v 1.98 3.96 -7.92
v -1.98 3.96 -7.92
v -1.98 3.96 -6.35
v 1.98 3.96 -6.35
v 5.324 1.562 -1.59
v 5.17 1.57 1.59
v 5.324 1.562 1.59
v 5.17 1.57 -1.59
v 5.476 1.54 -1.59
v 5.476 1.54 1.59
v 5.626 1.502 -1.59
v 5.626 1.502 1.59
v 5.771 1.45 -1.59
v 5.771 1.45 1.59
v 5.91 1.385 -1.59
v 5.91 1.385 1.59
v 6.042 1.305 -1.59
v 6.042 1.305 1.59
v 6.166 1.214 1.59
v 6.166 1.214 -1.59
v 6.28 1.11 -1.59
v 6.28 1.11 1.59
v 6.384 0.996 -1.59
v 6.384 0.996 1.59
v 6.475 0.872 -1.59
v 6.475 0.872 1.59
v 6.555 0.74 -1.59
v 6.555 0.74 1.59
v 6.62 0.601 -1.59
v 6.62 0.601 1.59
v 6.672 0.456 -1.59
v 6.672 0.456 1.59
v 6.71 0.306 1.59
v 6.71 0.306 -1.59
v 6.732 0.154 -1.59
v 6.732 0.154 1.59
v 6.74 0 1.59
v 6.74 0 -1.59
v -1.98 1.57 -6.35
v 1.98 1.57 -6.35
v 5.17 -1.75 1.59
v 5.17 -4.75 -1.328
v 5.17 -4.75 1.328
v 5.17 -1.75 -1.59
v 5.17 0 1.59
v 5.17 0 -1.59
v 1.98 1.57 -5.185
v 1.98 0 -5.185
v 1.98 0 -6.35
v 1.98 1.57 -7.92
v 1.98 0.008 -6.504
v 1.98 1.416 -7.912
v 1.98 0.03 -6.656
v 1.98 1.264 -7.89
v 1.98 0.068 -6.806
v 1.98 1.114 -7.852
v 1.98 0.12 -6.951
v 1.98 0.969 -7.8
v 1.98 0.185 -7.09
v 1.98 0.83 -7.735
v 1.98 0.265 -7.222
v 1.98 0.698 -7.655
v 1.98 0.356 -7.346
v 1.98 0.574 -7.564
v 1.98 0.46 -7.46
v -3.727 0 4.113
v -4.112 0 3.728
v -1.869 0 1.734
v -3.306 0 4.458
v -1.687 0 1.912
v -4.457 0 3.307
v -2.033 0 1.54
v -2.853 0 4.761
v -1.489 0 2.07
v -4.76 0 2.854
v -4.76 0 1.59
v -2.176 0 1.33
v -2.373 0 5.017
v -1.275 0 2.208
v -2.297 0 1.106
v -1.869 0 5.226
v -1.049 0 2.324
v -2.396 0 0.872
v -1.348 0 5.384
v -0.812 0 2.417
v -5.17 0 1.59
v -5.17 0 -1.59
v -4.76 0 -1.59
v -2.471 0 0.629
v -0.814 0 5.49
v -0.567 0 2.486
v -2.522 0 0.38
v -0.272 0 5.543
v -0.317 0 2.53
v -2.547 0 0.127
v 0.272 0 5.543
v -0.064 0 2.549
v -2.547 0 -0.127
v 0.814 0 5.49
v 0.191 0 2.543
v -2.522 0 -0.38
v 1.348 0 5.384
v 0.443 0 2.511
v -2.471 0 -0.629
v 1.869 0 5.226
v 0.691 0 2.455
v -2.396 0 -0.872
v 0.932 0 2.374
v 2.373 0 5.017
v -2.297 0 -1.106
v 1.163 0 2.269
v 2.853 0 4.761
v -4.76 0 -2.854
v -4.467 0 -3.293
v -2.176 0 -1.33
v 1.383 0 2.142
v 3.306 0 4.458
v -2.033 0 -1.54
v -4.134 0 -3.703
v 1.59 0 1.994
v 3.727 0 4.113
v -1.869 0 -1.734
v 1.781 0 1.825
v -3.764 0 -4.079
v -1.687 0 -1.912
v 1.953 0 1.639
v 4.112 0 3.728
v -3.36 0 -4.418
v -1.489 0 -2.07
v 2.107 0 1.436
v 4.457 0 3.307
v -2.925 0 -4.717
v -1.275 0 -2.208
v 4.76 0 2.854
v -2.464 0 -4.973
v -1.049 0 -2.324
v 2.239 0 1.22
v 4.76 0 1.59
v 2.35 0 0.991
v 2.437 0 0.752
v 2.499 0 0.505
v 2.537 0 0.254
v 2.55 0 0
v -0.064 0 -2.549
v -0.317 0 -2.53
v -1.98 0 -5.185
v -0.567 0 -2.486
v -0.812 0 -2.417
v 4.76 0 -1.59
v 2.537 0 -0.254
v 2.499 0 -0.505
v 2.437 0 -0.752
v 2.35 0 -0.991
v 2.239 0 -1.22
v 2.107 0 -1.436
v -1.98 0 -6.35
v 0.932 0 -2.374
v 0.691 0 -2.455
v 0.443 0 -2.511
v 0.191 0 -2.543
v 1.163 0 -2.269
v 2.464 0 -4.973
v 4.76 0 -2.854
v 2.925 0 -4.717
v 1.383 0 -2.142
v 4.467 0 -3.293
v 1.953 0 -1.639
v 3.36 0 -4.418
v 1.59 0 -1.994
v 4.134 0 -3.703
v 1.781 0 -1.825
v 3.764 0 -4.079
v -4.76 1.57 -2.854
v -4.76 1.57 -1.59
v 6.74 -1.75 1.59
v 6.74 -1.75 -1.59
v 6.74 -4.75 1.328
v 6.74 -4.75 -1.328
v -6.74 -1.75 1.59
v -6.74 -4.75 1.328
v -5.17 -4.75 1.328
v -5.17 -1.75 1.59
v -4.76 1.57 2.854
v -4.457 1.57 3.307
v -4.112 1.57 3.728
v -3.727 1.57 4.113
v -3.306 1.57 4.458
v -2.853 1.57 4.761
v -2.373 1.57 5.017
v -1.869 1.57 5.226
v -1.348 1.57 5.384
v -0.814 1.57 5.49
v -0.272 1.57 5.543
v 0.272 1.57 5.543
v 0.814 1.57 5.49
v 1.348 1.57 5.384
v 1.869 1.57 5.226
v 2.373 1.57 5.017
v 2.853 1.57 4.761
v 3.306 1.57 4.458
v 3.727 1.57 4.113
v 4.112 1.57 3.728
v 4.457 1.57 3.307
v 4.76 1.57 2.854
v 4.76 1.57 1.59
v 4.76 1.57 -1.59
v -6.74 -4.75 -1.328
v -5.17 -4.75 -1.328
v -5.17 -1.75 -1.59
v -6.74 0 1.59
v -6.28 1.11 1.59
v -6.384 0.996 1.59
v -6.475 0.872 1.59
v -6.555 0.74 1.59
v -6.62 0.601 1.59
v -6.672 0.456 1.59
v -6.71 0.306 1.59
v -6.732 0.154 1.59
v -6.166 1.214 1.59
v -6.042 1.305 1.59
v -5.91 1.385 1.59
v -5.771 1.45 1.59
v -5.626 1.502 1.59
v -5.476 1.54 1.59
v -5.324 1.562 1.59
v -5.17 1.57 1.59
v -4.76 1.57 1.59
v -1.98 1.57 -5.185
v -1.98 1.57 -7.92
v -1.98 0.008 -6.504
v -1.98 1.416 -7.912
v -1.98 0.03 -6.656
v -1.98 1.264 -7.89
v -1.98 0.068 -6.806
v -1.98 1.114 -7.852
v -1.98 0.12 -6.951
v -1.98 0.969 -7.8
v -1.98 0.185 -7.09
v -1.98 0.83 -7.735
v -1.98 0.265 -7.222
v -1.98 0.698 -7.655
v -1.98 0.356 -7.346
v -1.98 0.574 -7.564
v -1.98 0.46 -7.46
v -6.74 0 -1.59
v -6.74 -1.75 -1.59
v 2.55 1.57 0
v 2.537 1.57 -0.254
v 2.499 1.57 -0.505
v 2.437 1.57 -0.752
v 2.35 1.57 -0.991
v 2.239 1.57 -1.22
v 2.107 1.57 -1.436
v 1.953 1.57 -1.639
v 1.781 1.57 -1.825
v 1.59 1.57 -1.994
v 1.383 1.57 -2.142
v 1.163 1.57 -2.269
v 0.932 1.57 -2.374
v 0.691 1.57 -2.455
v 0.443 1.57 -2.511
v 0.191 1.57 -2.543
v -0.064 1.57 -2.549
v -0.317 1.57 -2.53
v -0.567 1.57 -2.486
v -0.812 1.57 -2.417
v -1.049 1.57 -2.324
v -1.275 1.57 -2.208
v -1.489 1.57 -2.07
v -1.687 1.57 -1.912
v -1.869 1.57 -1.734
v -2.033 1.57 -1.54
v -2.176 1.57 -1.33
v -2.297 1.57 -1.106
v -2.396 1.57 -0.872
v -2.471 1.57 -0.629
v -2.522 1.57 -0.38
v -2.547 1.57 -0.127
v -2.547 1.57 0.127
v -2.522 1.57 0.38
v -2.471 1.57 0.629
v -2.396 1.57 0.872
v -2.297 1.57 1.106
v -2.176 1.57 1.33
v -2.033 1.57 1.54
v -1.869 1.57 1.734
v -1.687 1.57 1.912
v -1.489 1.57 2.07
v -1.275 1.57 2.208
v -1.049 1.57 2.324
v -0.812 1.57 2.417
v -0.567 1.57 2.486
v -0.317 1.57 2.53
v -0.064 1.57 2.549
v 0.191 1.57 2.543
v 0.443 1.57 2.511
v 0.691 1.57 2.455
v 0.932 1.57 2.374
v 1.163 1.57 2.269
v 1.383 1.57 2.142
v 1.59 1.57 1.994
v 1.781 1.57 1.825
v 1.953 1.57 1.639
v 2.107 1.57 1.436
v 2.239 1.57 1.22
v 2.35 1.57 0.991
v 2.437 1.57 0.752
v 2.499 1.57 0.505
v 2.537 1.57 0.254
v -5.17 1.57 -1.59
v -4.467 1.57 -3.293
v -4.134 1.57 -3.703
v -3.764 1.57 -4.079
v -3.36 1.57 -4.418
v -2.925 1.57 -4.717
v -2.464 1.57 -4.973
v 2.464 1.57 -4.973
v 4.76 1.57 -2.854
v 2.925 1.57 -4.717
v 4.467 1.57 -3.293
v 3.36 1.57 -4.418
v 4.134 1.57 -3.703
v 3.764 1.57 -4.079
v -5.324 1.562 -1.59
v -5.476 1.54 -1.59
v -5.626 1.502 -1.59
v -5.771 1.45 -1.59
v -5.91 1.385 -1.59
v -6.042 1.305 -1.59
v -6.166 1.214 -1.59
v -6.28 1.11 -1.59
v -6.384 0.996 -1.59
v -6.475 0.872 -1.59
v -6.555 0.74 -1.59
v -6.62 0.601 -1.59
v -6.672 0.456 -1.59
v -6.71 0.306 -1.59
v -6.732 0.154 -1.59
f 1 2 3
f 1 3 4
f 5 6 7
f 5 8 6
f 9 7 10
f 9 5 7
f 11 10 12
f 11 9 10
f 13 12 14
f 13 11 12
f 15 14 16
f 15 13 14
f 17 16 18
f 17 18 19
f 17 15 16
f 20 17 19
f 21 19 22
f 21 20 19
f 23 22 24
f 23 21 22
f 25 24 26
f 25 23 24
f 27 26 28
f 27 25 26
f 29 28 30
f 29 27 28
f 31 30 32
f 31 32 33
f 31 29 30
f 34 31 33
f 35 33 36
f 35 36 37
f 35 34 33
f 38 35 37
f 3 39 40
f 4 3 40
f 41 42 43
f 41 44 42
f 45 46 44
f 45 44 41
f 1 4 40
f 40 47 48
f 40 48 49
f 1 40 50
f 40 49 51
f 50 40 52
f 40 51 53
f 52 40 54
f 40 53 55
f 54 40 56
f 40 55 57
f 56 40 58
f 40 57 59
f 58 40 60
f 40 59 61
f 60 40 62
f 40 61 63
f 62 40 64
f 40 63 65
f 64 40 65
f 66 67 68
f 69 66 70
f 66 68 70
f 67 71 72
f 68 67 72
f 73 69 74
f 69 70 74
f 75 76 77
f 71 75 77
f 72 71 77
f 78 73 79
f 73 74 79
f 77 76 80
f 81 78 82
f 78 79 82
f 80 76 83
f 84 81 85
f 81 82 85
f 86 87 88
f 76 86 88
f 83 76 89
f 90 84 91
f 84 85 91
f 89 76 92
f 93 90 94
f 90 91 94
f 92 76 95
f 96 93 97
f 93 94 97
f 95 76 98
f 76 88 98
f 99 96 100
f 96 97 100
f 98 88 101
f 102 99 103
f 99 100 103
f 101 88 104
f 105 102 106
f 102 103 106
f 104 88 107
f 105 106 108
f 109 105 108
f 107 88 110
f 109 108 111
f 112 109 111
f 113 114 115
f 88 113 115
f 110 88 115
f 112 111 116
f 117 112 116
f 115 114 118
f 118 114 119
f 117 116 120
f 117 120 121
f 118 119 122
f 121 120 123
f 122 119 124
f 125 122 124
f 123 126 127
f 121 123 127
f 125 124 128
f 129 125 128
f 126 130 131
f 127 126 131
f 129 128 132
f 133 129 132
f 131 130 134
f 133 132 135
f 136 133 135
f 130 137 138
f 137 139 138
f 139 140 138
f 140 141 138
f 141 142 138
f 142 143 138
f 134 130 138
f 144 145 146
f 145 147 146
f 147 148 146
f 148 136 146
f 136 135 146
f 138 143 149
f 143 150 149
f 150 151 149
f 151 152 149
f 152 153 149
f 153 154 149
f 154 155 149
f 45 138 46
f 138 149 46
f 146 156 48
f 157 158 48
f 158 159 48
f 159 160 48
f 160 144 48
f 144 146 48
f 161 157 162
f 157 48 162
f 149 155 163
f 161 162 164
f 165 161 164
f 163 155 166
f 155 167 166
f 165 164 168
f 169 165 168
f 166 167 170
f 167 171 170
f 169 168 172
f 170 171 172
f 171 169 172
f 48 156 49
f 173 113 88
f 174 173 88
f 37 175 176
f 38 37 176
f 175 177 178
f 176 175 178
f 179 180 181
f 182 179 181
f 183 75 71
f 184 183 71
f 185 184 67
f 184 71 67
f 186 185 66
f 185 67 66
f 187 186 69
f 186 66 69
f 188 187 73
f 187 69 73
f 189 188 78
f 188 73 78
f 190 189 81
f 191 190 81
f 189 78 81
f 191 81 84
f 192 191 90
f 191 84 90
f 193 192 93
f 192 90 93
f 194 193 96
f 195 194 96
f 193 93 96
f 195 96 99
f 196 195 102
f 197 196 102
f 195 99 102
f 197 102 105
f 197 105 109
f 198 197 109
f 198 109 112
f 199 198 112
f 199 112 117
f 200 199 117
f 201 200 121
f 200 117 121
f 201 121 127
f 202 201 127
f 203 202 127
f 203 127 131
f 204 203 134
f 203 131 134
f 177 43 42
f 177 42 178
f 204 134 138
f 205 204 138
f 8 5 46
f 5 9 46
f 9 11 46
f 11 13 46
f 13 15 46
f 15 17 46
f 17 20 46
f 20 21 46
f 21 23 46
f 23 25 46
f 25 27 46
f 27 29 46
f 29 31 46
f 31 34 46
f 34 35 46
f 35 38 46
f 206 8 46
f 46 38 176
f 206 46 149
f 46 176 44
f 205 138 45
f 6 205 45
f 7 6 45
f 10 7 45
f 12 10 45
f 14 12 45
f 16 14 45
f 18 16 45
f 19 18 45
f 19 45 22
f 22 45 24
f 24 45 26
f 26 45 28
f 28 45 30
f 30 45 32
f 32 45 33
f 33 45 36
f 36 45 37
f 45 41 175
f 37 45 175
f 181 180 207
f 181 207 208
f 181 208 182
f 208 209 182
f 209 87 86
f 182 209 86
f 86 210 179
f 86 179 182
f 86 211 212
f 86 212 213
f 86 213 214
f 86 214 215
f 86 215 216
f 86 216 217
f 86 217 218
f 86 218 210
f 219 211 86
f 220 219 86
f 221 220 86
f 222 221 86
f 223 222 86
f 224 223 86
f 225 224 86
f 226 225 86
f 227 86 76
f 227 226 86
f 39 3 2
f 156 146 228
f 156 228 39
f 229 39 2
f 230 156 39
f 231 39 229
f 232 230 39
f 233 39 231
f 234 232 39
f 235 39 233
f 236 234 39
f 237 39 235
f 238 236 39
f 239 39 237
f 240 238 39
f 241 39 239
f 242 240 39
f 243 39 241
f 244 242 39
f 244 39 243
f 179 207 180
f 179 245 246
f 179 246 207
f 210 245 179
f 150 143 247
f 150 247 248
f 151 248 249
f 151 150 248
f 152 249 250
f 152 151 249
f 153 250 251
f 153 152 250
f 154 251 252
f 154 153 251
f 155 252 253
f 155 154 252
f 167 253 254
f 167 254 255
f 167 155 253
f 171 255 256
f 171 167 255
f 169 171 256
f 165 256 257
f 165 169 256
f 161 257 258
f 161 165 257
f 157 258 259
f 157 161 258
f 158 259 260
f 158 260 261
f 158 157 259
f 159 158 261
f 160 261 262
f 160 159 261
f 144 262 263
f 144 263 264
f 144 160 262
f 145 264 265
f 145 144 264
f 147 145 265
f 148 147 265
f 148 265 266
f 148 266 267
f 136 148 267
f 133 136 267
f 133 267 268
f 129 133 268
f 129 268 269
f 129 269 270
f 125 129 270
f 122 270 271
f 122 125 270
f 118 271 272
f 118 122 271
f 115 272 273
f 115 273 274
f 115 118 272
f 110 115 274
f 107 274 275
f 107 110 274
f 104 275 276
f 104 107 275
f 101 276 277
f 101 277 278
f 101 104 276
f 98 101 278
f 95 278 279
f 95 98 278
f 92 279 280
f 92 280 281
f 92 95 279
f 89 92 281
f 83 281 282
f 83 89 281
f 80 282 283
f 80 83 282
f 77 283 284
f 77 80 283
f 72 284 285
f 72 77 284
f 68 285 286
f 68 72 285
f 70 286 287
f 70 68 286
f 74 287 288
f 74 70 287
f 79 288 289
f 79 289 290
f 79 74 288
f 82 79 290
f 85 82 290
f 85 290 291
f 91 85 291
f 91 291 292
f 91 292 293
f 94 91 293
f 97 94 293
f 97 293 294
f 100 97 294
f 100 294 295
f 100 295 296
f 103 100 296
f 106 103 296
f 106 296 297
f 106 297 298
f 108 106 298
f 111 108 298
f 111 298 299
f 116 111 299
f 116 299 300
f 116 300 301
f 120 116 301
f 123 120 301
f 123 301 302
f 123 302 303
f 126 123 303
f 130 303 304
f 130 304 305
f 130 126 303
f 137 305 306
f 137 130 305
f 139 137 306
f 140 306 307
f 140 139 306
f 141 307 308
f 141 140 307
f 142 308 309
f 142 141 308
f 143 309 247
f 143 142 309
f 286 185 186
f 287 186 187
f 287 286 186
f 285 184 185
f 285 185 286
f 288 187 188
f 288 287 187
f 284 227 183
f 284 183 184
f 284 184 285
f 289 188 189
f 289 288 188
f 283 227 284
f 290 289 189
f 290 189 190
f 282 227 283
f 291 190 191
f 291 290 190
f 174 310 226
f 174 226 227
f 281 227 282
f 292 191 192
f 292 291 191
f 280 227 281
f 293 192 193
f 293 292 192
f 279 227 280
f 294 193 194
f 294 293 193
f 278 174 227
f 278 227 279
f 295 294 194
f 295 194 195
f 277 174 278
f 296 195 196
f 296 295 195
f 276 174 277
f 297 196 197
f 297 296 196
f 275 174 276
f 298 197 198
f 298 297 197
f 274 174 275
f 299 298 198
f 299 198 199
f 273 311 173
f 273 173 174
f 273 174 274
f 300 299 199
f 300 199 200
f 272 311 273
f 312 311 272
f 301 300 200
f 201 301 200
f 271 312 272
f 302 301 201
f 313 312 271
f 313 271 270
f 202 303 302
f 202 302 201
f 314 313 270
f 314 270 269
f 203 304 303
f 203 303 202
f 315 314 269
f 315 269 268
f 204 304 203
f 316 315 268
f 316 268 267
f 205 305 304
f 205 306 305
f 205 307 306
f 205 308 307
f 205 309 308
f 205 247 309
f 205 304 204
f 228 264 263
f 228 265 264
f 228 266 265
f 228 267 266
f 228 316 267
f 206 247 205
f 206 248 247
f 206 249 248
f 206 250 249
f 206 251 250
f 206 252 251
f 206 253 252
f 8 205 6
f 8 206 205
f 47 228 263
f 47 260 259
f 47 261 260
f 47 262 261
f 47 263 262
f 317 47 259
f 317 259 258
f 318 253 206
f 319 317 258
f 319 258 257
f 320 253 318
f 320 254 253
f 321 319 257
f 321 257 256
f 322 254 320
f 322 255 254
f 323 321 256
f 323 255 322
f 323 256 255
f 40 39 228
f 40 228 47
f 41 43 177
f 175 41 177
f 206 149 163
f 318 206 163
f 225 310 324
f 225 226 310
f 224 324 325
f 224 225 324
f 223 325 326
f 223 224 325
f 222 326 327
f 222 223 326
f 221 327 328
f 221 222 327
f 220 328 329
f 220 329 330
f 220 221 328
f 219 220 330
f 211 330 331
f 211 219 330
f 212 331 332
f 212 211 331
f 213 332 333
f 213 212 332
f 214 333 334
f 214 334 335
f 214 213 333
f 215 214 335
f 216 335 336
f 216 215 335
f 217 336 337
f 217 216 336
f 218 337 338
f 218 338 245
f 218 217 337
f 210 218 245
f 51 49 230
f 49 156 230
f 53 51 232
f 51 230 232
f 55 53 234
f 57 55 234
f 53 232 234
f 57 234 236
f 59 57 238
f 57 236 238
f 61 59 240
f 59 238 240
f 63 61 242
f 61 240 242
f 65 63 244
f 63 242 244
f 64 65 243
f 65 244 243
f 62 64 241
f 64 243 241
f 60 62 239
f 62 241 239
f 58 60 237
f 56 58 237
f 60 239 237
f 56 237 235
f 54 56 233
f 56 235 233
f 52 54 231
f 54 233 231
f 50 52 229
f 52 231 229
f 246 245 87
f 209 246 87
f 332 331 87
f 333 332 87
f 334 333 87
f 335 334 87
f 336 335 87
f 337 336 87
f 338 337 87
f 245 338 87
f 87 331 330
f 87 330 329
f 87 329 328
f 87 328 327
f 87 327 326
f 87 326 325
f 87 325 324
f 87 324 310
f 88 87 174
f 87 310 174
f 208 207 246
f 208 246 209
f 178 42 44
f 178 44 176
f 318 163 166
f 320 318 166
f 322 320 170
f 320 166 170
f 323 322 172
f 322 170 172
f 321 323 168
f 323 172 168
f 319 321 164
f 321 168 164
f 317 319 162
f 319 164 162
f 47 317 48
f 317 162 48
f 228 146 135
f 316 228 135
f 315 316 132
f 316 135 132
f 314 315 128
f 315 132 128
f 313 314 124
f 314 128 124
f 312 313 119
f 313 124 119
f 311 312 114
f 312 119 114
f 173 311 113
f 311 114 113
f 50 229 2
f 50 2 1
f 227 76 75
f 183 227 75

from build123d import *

# Parameters (mm, degrees)
SKETCH1_R             = 2.55
BOSS_EXTRUDE1_DEPTH   = 1.57
SKETCH2_W             = 1.57
SKETCH2_H             = 3.18
BOSS_EXTRUDE2_DEPTH   = 4.75
SKETCH3_W             = 3.96
SKETCH3_H             = 1.57
BOSS_EXTRUDE3_DEPTH   = 2.39
FILLET1_R             = 1.57
CHAMFER1_SIZE         = 3
CHAMFER1_SIZE2        = 0.262465991
CHAMFER1_PART_2_SIZE  = 3
CHAMFER1_PART_2_SIZE2 = 0.262465991
CHAMFER1_PART_3_SIZE  = 3
CHAMFER1_PART_3_SIZE2 = 0.262465991
CHAMFER1_PART_4_SIZE  = 3
CHAMFER1_PART_4_SIZE2 = 0.262465991


with BuildPart() as part:
    # Sketch1 → Boss-Extrude1 (new body)
    with BuildSketch(Plane(origin=(0, 0, 0), x_dir=(1, 0, 0), z_dir=(0, 1, 0))):
        with BuildLine():
            Line((-4.76, 2.853927119), (-4.76, 1.59))
            Line((-4.76, 1.59), (-6.74, 1.59))
            Line((-6.74, 1.59), (-6.74, -1.59))
            Line((-6.74, -1.59), (-4.76, -1.59))
            Line((-4.76, -1.59), (-4.76, -2.853927119))
            ThreePointArc((-4.76, -2.853927119), (0, -5.55), (4.76, -2.853927119))
            Line((4.76, -2.853927119), (4.76, -1.59))
            Line((4.76, -1.59), (6.74, -1.59))
            Line((6.74, -1.59), (6.74, 1.59))
            Line((6.74, 1.59), (4.76, 1.59))
            Line((4.76, 1.59), (4.76, 2.853927119))
            ThreePointArc((4.76, 2.853927119), (3.565828986, 4.252924128), (1.98, 5.184795078))
            Line((1.98, 5.184795078), (1.98, 7.92))
            Line((1.98, 7.92), (-1.98, 7.92))
            Line((-1.98, 7.92), (-1.98, 5.184795078))
            ThreePointArc((-1.98, 5.184795078), (-3.565828986, 4.252924128), (-4.76, 2.853927119))
        make_face()
        Circle(SKETCH1_R, mode=Mode.SUBTRACT)
    extrude(amount=BOSS_EXTRUDE1_DEPTH)

    # Sketch2 → Boss-Extrude2 (add)
    with BuildSketch(Plane.XZ):
        with Locations((-5.955, 0)):
            Rectangle(SKETCH2_W, SKETCH2_H)
        with Locations((5.955, 0)):
            Rectangle(SKETCH2_W, SKETCH2_H)
    extrude(amount=BOSS_EXTRUDE2_DEPTH)

    # Sketch3 → Boss-Extrude3 (add)
    with BuildSketch(Plane(origin=(0, 1.57, 0), x_dir=(1, 0, 0), z_dir=(0, 1, 0))):
        with Locations((0, 7.135)):
            Rectangle(SKETCH3_W, SKETCH3_H)
    extrude(amount=BOSS_EXTRUDE3_DEPTH)

    # Fillet1
    fillet1_edges = [part.edges().sort_by_distance(p)[0] for p in [
        (0, 0, -7.92),
        (6.74, 1.57, 0),
        (-6.74, 1.57, 0),
    ]]
    fillet(fillet1_edges, radius=FILLET1_R)

    # Chamfer1
    chamfer1_edges = [part.edges().sort_by_distance(p)[0] for p in [
        (5.955, -4.75, -1.59),
    ]]
    chamfer1_side = [part.faces().sort_by_distance(p)[0] for p in [
        (5.8686205, -1.585741835, -1.59),
    ]]
    chamfer(chamfer1_edges, length=CHAMFER1_SIZE, length2=CHAMFER1_SIZE2, reference=chamfer1_side[0])

    # Chamfer1 part 2
    chamfer1_part_2_edges = [part.edges().sort_by_distance(p)[0] for p in [
        (5.955, -4.75, 1.59),
    ]]
    chamfer1_part_2_side = [part.faces().sort_by_distance(p)[0] for p in [
        (5.8686205, -1.585741835, 1.59),
    ]]
    chamfer(chamfer1_part_2_edges, length=CHAMFER1_PART_2_SIZE, length2=CHAMFER1_PART_2_SIZE2, reference=chamfer1_part_2_side[0])

    # Chamfer1 part 3
    chamfer1_part_3_edges = [part.edges().sort_by_distance(p)[0] for p in [
        (-5.955, -4.75, -1.59),
    ]]
    chamfer1_part_3_side = [part.faces().sort_by_distance(p)[0] for p in [
        (-5.8686205, -1.585741835, -1.59),
    ]]
    chamfer(chamfer1_part_3_edges, length=CHAMFER1_PART_3_SIZE, length2=CHAMFER1_PART_3_SIZE2, reference=chamfer1_part_3_side[0])

    # Chamfer1 part 4
    chamfer1_part_4_edges = [part.edges().sort_by_distance(p)[0] for p in [
        (-5.955, -4.75, 1.59),
    ]]
    chamfer1_part_4_side = [part.faces().sort_by_distance(p)[0] for p in [
        (-5.8686205, -1.585741835, 1.59),
    ]]
    chamfer(chamfer1_part_4_edges, length=CHAMFER1_PART_4_SIZE, length2=CHAMFER1_PART_4_SIZE2, reference=chamfer1_part_4_side[0])


solid = part.part
